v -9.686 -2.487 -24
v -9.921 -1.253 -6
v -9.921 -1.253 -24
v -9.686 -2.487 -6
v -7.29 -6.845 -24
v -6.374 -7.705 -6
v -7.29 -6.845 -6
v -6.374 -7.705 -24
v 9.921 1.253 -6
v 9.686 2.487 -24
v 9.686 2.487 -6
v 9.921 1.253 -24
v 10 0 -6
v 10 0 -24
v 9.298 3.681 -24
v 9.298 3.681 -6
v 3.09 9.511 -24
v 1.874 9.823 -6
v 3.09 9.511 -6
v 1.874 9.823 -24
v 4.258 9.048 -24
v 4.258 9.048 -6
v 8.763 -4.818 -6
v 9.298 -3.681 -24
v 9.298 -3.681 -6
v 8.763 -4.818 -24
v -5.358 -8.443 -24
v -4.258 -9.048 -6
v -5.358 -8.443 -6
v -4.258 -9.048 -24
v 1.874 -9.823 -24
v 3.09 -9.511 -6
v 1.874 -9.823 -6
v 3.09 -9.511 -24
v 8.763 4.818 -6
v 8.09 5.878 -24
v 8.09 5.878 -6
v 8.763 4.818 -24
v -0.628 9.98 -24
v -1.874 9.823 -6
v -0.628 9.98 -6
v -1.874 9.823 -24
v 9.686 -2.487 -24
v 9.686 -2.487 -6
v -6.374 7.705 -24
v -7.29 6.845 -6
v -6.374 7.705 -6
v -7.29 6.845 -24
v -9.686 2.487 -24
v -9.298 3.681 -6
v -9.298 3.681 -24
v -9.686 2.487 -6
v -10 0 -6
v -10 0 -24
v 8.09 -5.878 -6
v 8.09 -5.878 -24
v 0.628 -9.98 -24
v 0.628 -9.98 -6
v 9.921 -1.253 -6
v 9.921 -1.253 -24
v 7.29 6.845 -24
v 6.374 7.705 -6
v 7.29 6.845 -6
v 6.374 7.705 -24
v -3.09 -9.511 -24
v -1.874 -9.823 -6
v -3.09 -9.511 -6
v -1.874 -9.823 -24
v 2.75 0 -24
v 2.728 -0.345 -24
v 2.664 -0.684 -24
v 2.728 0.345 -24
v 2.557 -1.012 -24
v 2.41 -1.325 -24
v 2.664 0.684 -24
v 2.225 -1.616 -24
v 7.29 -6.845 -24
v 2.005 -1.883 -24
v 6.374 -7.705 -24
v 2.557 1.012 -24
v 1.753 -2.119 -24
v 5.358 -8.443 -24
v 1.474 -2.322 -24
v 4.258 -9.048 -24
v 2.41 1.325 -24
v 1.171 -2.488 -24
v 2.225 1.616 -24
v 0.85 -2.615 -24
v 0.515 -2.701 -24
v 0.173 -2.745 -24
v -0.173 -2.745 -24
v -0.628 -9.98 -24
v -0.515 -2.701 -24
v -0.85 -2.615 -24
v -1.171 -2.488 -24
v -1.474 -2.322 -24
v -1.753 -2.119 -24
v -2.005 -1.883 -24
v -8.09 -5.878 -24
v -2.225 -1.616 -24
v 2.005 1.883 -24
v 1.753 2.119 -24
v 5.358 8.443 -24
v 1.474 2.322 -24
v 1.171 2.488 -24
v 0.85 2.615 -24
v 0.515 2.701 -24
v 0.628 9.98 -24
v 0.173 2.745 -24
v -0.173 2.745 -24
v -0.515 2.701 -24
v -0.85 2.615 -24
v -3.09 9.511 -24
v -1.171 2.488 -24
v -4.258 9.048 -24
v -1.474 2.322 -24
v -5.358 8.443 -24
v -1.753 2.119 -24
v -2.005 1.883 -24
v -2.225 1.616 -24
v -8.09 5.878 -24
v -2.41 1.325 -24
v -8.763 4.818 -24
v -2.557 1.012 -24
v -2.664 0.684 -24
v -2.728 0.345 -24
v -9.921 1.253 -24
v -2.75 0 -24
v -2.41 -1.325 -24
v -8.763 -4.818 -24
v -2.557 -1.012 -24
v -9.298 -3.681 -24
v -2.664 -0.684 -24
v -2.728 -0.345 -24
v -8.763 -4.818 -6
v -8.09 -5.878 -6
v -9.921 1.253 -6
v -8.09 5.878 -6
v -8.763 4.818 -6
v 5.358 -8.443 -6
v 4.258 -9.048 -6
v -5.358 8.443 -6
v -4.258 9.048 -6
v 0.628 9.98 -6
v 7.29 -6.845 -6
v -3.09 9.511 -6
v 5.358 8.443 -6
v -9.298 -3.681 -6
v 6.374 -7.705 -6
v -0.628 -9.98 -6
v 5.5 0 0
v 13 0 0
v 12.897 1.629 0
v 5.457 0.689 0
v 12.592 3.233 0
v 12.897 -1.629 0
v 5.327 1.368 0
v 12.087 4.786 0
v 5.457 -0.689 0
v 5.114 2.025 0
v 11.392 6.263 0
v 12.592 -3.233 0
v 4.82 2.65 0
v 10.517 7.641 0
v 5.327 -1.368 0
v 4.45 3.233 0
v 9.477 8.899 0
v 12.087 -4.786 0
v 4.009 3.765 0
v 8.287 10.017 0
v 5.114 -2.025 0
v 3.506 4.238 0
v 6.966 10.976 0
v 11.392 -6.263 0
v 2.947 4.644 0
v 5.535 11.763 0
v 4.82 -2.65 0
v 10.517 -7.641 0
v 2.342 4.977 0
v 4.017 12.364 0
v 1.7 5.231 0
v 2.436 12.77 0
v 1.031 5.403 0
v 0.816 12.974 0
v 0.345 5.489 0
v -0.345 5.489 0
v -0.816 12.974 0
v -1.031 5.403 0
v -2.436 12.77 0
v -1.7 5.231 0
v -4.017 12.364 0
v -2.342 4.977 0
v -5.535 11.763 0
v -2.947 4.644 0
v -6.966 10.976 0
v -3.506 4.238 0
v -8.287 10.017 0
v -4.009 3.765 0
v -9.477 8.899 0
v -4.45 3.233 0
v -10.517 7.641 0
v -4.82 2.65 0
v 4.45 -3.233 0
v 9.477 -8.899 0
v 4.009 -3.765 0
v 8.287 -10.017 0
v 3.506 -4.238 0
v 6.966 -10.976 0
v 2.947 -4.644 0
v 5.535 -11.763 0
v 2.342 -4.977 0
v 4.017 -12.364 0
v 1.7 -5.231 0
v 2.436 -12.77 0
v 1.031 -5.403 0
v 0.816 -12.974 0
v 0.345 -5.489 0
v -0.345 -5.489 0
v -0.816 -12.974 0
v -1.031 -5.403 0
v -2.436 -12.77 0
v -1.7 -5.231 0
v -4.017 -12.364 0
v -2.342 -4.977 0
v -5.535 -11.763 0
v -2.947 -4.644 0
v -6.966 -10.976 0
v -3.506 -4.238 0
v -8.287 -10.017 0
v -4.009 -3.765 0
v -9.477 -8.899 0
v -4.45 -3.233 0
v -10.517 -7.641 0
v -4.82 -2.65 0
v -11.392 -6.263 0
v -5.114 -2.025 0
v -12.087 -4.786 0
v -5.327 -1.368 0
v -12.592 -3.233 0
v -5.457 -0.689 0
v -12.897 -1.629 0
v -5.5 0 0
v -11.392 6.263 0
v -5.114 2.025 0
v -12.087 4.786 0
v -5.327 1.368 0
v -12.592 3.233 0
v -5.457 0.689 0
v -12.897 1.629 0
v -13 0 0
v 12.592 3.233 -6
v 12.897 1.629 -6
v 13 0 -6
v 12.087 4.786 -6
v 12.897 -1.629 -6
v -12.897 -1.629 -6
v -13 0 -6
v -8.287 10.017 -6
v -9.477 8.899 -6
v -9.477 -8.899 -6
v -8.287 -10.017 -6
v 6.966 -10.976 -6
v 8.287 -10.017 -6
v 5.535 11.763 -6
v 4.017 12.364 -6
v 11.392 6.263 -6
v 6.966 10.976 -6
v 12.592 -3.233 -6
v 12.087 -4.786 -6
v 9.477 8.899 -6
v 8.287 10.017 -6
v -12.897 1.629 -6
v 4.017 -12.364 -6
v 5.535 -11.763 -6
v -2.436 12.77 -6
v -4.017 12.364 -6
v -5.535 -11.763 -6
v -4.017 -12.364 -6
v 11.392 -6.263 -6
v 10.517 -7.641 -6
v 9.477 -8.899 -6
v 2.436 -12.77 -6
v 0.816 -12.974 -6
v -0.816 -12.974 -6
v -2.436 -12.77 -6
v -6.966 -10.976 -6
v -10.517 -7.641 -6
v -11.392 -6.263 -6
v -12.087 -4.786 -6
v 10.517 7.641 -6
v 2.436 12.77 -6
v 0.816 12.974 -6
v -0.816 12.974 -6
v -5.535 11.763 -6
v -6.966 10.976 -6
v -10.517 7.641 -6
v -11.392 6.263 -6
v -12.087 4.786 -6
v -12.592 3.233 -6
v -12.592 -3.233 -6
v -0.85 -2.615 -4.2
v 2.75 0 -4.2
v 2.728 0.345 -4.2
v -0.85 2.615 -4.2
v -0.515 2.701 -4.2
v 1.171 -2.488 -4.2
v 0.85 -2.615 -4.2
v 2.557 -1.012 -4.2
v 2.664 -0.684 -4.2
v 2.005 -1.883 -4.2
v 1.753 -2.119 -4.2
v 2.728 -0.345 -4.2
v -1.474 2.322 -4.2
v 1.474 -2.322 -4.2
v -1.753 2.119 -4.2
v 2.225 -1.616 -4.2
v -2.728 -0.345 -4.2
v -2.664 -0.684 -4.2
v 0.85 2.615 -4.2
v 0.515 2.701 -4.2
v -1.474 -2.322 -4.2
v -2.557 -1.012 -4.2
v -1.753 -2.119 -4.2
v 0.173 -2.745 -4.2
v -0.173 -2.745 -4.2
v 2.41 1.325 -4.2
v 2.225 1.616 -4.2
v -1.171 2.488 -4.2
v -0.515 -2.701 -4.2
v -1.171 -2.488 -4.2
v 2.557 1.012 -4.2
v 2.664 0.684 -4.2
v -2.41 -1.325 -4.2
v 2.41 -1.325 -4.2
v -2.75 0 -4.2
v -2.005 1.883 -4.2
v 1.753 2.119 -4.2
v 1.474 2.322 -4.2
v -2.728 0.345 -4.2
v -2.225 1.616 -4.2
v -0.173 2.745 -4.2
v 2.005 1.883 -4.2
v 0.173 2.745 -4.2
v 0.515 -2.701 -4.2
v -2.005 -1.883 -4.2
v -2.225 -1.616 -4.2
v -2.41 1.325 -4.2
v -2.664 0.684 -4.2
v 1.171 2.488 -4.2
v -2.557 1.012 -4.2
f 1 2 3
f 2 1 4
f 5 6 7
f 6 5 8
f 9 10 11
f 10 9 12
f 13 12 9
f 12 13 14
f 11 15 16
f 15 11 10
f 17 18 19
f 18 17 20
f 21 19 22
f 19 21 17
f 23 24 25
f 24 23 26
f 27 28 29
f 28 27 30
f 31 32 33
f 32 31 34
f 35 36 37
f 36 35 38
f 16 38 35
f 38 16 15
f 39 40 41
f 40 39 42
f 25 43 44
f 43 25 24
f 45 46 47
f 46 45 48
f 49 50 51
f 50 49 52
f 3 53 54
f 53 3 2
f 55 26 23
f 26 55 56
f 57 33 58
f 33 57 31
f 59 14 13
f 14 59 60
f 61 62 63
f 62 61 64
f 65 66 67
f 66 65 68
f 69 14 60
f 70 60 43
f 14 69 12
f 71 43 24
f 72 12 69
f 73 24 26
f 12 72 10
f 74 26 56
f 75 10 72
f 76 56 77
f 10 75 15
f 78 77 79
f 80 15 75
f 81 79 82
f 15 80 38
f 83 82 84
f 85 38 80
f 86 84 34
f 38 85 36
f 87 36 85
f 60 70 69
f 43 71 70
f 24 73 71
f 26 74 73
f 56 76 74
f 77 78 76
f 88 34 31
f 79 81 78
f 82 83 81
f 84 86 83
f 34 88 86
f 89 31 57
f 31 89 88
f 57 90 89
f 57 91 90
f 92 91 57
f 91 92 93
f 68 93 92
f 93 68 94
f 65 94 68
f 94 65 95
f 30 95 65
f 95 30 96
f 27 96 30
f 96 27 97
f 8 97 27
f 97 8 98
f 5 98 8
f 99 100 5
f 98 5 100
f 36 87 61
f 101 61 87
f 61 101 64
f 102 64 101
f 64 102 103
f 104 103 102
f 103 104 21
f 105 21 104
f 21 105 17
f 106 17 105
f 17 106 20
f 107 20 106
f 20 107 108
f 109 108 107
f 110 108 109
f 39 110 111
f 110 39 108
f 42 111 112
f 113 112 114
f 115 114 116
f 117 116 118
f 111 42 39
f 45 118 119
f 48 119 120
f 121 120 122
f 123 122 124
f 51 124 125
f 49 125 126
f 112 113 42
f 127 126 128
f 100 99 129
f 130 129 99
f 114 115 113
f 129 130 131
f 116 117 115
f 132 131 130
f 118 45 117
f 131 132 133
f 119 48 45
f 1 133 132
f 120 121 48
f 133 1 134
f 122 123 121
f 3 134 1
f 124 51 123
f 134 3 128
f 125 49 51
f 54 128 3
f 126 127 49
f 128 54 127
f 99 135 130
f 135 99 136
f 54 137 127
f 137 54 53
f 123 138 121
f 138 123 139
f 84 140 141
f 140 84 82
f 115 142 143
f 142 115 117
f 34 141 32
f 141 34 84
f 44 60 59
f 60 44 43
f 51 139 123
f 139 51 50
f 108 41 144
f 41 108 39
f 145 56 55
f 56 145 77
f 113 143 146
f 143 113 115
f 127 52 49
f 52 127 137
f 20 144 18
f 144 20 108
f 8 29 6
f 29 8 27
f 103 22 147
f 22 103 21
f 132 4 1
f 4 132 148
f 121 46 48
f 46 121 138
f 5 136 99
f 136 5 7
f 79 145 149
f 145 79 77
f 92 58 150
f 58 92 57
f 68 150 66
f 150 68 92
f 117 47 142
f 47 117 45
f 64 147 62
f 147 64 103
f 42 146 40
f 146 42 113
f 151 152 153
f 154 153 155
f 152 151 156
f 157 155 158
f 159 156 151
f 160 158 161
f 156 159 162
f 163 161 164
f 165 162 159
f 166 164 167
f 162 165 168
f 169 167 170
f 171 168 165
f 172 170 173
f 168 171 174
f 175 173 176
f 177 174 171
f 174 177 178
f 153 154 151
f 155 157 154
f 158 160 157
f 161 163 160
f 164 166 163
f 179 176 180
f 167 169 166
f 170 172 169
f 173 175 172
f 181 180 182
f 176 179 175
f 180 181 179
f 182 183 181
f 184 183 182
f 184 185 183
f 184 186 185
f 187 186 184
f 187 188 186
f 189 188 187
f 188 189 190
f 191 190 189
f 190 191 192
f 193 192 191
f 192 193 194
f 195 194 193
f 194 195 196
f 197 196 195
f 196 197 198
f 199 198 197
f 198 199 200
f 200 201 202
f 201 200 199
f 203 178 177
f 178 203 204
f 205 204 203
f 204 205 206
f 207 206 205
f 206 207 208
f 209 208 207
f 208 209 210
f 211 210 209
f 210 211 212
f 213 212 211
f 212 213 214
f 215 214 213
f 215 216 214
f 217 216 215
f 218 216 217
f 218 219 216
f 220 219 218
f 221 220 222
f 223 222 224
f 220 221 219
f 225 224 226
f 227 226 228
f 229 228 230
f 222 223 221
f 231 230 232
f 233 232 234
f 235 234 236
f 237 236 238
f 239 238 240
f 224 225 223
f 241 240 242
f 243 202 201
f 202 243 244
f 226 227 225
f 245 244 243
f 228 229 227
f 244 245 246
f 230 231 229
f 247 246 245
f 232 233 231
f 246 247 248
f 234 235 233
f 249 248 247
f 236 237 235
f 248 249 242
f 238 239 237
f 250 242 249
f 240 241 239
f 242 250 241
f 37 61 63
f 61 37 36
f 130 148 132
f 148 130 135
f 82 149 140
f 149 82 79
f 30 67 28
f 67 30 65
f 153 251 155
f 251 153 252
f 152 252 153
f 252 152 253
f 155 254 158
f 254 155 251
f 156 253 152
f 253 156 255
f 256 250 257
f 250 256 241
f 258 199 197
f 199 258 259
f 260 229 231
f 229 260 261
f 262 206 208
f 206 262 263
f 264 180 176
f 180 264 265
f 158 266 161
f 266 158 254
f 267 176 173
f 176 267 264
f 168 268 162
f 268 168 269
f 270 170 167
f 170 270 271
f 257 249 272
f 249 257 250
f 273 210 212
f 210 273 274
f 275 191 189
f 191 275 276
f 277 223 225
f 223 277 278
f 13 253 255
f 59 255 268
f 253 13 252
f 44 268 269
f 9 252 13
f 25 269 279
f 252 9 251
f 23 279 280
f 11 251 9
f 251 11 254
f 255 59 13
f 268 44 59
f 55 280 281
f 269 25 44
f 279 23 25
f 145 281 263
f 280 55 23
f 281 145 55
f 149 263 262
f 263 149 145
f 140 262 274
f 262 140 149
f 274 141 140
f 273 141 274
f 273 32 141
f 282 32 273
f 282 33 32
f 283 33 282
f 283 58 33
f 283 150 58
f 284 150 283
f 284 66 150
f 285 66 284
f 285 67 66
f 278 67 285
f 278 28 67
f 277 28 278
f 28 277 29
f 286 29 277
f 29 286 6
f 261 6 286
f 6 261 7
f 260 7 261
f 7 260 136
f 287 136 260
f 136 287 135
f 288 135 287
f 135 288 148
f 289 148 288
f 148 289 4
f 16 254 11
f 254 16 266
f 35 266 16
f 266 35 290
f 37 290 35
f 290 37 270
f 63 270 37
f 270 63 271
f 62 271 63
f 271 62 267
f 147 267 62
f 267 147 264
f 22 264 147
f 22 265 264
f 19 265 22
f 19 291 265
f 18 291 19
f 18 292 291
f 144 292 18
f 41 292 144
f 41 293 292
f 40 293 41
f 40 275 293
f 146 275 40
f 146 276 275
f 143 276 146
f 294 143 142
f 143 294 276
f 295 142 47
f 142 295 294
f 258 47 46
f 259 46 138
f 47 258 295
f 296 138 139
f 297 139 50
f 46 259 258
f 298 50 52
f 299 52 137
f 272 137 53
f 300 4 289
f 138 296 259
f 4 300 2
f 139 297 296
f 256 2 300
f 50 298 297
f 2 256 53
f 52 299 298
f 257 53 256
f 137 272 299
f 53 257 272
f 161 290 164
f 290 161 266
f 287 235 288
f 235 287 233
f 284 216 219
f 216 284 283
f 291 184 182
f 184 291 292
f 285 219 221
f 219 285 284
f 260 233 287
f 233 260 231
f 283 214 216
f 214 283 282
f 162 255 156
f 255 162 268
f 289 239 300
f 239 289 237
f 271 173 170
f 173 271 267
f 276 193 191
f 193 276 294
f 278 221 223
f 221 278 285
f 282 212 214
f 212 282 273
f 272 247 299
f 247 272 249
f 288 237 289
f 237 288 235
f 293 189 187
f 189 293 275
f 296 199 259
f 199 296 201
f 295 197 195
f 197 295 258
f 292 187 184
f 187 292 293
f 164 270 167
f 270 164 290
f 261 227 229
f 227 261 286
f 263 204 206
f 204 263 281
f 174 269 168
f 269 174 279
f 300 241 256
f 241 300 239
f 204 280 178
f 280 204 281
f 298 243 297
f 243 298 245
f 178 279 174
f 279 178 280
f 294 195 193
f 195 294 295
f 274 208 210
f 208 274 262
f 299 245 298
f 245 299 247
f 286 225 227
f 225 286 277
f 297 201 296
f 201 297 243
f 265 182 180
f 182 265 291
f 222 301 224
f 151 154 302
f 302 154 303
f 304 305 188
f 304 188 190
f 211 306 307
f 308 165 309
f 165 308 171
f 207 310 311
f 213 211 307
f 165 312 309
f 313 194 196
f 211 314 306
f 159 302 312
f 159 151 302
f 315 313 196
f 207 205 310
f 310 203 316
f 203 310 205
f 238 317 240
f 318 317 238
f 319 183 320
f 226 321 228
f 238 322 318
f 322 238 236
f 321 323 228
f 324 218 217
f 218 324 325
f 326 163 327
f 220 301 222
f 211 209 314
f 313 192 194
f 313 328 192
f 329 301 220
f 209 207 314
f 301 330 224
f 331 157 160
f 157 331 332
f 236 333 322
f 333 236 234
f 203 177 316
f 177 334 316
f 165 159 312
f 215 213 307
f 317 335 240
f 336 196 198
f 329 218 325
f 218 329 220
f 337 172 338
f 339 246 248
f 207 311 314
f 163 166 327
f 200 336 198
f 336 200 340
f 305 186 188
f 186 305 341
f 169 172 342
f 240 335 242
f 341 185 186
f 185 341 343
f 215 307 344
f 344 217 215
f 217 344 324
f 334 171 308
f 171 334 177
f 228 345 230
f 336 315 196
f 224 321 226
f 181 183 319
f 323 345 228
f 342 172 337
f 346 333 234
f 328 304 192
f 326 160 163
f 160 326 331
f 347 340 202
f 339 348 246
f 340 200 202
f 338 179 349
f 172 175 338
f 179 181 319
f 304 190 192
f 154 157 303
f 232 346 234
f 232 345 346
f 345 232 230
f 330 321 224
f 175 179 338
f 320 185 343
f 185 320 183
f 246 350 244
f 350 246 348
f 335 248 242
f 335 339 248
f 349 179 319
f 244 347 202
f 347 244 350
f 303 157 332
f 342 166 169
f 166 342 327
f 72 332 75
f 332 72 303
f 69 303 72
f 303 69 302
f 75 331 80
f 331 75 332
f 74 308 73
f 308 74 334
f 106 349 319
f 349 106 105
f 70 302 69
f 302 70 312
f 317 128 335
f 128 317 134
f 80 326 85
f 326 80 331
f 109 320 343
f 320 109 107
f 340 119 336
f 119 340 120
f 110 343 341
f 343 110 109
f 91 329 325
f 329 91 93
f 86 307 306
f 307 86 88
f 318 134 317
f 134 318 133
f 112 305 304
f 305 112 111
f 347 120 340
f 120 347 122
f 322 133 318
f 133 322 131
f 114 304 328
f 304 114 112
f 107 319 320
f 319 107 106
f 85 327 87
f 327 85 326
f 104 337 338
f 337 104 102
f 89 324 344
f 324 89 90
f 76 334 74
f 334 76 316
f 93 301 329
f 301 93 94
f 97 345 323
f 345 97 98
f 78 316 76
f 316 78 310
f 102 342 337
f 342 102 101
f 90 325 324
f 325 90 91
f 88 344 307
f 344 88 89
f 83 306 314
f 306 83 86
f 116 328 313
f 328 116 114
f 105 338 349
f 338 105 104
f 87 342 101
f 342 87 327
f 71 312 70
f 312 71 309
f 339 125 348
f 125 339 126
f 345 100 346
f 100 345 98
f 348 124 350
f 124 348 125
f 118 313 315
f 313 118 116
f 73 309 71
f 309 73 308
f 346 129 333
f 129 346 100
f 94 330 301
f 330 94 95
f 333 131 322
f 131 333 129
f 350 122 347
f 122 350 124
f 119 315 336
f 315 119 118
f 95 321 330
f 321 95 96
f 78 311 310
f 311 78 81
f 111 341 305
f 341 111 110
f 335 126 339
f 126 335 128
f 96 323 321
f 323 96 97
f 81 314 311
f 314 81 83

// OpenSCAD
$fn = 50;


difference() {
	union() {
		translate(v = [0, 0, -24.0000000000]) {
			cylinder(h = 24, r = 10.0000000000);
		}
		translate(v = [0, 0, -6.0000000000]) {
			cylinder(h = 6, r = 13.0000000000);
		}
	}
	union() {
		translate(v = [0, 0, 0]) {
			rotate(a = [0, 0, 0]) {
				difference() {
					union() {
						#translate(v = [0, 0, -24.0000000000]) {
							cylinder(h = 24, r = 2.2500000000);
						}
						#translate(v = [0, 0, -4.2000000000]) {
							cylinder(h = 4.2000000000, r = 10.0000000000, r1 = 2.7500000000, r2 = 5.5000000000);
						}
						#translate(v = [0, 0, -24.0000000000]) {
							cylinder(h = 24, r = 2.7500000000);
						}
						#translate(v = [0, 0, -24.0000000000]) {
							cylinder(h = 24, r = 2.2500000000);
						}
					}
					union();
				}
			}
		}
	}
}
